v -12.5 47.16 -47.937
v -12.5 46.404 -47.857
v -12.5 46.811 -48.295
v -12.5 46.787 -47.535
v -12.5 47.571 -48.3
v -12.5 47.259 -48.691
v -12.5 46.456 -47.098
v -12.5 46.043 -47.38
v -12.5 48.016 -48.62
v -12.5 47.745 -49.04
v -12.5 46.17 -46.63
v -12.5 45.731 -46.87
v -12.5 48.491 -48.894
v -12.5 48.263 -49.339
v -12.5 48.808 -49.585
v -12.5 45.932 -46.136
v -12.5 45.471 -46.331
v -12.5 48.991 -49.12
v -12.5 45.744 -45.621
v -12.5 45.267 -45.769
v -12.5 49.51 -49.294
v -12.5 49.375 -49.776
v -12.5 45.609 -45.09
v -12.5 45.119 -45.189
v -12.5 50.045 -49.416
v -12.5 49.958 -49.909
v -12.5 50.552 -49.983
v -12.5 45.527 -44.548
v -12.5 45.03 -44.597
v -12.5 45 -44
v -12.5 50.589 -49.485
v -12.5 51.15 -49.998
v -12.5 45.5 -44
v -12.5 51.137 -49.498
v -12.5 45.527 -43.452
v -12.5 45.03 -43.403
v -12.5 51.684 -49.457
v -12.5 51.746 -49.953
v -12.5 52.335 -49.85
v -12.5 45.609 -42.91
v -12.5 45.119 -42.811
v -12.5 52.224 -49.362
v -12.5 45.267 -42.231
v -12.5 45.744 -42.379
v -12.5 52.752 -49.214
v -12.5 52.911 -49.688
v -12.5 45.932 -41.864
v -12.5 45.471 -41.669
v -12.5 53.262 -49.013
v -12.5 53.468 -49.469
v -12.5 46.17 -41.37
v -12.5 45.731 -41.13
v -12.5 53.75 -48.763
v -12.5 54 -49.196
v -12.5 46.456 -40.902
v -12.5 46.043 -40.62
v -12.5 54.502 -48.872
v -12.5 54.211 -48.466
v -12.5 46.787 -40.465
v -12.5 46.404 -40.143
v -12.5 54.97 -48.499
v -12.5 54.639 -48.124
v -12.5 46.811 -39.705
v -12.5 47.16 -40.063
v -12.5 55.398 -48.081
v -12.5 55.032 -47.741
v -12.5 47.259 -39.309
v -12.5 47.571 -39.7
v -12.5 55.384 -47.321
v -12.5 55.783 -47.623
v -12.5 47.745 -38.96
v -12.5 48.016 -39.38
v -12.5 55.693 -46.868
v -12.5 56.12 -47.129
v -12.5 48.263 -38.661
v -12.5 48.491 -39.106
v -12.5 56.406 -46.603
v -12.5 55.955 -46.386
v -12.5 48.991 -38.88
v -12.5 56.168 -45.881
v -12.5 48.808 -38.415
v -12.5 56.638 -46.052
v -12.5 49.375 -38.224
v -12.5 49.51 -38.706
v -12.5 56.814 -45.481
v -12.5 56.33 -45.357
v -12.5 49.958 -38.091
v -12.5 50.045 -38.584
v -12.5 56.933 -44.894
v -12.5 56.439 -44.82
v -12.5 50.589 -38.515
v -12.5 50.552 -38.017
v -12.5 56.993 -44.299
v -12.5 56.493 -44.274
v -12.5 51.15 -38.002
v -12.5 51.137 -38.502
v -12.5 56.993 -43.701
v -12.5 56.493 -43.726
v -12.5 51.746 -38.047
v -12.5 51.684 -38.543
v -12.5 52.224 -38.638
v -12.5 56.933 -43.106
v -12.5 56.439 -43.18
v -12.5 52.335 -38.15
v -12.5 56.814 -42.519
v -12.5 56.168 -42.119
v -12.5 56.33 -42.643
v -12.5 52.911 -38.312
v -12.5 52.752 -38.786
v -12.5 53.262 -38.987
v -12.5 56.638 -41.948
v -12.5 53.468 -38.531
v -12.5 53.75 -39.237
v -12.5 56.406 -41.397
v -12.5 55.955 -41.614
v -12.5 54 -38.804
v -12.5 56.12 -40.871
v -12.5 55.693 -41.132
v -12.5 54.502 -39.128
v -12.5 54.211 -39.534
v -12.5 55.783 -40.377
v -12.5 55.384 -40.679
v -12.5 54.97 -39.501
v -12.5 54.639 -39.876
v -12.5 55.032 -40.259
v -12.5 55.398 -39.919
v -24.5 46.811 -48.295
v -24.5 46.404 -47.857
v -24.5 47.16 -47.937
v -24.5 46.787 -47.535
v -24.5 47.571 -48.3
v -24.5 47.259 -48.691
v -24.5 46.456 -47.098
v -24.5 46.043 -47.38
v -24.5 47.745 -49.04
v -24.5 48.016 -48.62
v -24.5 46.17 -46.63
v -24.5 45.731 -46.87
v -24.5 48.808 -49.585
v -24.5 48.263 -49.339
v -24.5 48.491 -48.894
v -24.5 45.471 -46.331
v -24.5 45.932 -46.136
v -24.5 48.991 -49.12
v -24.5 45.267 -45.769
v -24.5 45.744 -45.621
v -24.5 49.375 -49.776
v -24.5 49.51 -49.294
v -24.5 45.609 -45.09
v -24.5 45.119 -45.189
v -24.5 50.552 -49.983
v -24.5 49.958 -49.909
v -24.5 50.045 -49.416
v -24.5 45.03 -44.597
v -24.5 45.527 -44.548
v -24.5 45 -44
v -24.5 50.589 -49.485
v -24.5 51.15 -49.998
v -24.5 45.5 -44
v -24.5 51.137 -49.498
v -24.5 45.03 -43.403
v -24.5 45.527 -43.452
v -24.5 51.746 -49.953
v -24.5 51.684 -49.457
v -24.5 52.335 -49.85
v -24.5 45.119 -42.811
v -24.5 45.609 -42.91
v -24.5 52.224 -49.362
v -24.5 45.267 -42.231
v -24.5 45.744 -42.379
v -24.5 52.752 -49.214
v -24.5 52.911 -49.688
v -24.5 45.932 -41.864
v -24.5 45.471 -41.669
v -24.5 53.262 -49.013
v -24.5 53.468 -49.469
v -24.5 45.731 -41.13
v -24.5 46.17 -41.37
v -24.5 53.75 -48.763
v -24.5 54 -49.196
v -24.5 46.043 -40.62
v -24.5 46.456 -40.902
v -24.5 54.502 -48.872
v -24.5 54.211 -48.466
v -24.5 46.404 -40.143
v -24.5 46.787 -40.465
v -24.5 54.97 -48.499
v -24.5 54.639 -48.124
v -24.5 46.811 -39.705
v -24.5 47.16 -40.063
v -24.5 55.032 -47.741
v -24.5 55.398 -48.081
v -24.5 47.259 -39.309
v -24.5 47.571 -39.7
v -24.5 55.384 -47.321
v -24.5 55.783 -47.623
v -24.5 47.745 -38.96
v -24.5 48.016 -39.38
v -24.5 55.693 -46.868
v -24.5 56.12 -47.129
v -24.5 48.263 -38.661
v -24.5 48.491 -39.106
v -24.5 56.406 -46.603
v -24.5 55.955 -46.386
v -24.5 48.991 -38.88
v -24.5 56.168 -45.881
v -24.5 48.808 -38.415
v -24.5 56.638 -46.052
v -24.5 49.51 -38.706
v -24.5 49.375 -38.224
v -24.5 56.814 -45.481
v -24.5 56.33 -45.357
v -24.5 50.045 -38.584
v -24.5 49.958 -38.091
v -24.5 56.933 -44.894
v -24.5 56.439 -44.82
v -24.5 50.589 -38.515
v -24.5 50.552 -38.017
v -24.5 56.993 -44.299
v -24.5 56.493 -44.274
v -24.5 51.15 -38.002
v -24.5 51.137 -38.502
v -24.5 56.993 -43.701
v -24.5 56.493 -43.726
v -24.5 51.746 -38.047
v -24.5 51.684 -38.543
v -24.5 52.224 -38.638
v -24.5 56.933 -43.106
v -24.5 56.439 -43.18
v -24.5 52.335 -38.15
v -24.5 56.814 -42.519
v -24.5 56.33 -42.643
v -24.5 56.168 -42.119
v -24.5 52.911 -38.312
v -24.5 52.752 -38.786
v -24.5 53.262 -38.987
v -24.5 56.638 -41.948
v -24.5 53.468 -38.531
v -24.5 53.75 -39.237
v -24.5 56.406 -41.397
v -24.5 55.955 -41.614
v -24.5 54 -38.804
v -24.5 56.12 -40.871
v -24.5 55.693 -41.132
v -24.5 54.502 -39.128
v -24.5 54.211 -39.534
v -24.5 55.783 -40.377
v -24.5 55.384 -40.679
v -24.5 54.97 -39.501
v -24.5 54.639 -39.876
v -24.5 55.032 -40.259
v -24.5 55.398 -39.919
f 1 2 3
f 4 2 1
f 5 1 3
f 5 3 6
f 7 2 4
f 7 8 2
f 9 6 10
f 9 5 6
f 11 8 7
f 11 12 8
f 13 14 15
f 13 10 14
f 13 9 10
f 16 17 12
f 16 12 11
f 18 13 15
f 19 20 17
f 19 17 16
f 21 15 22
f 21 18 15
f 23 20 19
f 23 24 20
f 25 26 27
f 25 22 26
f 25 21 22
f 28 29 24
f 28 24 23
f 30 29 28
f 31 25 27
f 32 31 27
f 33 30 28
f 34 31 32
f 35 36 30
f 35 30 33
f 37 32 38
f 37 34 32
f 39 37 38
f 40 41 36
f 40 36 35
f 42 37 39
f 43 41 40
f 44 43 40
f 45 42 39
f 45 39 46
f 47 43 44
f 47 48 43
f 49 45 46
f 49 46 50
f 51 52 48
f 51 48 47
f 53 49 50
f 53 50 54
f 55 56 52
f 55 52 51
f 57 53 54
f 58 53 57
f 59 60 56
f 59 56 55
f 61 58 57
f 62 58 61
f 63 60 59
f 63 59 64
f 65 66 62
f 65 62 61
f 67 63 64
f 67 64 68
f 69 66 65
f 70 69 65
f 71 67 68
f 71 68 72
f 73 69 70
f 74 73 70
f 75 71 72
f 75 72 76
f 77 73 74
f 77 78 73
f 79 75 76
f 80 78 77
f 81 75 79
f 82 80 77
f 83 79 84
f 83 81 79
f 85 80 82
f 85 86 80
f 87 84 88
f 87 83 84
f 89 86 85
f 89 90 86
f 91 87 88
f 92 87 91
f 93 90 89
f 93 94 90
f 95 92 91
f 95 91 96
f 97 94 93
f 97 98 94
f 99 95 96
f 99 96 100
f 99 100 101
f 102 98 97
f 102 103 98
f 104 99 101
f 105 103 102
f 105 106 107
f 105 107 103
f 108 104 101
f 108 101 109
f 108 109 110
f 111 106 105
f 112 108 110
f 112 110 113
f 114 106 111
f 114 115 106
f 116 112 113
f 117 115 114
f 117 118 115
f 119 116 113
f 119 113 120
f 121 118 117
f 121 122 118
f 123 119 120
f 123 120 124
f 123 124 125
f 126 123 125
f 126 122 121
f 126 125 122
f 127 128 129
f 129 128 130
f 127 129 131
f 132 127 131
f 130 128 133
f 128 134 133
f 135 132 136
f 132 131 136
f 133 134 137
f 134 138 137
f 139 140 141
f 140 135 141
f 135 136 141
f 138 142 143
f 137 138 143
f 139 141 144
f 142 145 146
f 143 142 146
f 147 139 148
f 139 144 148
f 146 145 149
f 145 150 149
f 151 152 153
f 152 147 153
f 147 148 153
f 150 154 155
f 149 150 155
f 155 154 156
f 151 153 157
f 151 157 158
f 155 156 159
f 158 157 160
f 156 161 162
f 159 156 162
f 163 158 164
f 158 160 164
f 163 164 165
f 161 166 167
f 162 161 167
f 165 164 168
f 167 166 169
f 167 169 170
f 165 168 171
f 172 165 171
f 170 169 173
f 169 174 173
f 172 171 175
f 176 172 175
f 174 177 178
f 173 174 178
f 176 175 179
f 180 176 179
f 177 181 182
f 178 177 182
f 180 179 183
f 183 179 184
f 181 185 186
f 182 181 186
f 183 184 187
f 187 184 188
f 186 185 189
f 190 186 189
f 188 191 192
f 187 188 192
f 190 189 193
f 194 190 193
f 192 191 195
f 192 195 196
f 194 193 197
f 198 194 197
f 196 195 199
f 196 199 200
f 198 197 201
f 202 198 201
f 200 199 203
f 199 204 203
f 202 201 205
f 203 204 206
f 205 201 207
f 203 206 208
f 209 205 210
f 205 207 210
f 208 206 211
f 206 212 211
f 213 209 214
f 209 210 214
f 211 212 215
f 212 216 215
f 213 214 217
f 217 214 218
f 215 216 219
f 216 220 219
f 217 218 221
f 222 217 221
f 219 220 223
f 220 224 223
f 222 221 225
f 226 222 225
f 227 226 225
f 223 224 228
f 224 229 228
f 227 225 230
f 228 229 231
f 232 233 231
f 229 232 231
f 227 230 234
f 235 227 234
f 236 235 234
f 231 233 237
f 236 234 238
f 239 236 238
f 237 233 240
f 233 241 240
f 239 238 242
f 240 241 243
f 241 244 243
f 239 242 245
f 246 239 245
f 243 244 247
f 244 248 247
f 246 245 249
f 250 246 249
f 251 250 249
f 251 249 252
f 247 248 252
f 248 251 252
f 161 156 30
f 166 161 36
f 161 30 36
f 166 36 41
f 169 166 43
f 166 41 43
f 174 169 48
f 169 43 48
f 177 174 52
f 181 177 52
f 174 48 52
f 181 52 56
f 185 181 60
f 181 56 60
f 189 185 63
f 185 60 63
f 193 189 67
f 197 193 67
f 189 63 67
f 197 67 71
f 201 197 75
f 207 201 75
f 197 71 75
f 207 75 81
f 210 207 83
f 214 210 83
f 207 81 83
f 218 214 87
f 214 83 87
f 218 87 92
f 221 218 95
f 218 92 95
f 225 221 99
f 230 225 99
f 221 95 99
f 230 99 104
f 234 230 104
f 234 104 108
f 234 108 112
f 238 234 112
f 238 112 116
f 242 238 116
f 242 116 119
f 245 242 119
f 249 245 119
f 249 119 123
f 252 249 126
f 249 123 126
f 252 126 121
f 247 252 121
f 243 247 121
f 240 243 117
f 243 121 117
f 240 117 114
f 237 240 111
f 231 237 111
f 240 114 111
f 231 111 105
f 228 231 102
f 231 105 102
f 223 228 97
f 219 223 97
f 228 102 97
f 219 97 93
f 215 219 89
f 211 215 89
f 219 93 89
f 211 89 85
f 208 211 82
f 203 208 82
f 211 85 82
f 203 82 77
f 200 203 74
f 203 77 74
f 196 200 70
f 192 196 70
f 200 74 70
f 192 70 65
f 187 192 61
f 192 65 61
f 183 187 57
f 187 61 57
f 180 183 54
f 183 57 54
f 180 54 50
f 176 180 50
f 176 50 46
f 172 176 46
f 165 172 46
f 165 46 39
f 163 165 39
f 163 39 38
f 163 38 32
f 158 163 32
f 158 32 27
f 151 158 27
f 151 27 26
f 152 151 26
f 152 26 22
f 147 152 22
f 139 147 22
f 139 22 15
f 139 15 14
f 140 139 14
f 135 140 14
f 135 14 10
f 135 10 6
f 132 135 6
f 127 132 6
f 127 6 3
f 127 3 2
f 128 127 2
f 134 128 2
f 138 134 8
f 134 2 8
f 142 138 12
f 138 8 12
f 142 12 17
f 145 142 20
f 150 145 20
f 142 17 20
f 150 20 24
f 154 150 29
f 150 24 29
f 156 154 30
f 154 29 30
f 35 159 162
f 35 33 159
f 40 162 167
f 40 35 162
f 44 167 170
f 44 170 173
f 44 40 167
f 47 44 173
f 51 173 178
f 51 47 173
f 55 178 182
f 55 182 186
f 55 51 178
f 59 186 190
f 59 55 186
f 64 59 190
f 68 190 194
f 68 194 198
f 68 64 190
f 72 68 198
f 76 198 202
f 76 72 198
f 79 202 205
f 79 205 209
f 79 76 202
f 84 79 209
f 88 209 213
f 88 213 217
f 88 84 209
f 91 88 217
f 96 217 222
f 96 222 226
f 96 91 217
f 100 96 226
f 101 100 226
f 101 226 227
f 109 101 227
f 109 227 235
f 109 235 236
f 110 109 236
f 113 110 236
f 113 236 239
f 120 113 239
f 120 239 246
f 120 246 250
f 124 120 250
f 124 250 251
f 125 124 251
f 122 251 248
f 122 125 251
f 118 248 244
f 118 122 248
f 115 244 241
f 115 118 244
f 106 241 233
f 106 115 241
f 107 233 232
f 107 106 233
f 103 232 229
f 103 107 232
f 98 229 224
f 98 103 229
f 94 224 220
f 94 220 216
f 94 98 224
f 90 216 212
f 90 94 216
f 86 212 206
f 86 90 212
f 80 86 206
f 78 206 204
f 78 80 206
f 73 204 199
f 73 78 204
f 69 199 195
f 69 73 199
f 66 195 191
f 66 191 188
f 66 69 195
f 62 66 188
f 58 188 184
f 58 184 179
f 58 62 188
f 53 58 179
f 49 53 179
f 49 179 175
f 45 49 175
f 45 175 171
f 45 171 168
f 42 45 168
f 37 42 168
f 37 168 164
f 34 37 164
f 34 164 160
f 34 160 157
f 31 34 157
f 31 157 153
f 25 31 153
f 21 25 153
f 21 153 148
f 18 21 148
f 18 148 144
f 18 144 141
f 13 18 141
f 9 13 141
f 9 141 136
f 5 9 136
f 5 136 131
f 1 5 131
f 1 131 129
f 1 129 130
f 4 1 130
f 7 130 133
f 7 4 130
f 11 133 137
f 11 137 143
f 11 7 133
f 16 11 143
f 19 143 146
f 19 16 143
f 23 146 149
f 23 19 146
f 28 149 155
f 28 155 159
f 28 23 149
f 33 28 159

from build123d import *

# Parameters (mm, degrees)
SKETCH036_W = 12
SKETCH036_H = 0.5


with BuildPart() as washer:
    # Sketch036 → Revolution001 (revolve)
    with BuildSketch(Plane.XY):
        with Locations((-18.5, 5.75)):
            Rectangle(SKETCH036_W, SKETCH036_H)
    revolve(axis=Axis((0, 0, 0), (1, 0, 0)))


with BuildPart() as washer_1:
    # Body008 placement: moved
    add(washer.part.moved(Location((0, -51, -44))))


with BuildPart() as part_mirroring006:
    # Part__Mirroring006: instance of washer
    add(washer_1.part.mirror(Plane(origin=(0, 0, 0), x_dir=(0, -1, 0), z_dir=(1, 0, 0))))


with BuildPart() as part_mirroring007:
    # Part__Mirroring007: instance of Part__Mirroring006
    add(part_mirroring006.part.mirror(Plane(origin=(0, 0, 0), x_dir=(1, 0, 0), z_dir=(0, 1, 0))))


with BuildPart() as part_mirroring008:
    # Part__Mirroring008: instance of Part__Mirroring007
    add(part_mirroring007.part.mirror(Plane(origin=(0, 0, 0), x_dir=(0, -1, 0), z_dir=(1, 0, 0))))


solid = part_mirroring008.part
